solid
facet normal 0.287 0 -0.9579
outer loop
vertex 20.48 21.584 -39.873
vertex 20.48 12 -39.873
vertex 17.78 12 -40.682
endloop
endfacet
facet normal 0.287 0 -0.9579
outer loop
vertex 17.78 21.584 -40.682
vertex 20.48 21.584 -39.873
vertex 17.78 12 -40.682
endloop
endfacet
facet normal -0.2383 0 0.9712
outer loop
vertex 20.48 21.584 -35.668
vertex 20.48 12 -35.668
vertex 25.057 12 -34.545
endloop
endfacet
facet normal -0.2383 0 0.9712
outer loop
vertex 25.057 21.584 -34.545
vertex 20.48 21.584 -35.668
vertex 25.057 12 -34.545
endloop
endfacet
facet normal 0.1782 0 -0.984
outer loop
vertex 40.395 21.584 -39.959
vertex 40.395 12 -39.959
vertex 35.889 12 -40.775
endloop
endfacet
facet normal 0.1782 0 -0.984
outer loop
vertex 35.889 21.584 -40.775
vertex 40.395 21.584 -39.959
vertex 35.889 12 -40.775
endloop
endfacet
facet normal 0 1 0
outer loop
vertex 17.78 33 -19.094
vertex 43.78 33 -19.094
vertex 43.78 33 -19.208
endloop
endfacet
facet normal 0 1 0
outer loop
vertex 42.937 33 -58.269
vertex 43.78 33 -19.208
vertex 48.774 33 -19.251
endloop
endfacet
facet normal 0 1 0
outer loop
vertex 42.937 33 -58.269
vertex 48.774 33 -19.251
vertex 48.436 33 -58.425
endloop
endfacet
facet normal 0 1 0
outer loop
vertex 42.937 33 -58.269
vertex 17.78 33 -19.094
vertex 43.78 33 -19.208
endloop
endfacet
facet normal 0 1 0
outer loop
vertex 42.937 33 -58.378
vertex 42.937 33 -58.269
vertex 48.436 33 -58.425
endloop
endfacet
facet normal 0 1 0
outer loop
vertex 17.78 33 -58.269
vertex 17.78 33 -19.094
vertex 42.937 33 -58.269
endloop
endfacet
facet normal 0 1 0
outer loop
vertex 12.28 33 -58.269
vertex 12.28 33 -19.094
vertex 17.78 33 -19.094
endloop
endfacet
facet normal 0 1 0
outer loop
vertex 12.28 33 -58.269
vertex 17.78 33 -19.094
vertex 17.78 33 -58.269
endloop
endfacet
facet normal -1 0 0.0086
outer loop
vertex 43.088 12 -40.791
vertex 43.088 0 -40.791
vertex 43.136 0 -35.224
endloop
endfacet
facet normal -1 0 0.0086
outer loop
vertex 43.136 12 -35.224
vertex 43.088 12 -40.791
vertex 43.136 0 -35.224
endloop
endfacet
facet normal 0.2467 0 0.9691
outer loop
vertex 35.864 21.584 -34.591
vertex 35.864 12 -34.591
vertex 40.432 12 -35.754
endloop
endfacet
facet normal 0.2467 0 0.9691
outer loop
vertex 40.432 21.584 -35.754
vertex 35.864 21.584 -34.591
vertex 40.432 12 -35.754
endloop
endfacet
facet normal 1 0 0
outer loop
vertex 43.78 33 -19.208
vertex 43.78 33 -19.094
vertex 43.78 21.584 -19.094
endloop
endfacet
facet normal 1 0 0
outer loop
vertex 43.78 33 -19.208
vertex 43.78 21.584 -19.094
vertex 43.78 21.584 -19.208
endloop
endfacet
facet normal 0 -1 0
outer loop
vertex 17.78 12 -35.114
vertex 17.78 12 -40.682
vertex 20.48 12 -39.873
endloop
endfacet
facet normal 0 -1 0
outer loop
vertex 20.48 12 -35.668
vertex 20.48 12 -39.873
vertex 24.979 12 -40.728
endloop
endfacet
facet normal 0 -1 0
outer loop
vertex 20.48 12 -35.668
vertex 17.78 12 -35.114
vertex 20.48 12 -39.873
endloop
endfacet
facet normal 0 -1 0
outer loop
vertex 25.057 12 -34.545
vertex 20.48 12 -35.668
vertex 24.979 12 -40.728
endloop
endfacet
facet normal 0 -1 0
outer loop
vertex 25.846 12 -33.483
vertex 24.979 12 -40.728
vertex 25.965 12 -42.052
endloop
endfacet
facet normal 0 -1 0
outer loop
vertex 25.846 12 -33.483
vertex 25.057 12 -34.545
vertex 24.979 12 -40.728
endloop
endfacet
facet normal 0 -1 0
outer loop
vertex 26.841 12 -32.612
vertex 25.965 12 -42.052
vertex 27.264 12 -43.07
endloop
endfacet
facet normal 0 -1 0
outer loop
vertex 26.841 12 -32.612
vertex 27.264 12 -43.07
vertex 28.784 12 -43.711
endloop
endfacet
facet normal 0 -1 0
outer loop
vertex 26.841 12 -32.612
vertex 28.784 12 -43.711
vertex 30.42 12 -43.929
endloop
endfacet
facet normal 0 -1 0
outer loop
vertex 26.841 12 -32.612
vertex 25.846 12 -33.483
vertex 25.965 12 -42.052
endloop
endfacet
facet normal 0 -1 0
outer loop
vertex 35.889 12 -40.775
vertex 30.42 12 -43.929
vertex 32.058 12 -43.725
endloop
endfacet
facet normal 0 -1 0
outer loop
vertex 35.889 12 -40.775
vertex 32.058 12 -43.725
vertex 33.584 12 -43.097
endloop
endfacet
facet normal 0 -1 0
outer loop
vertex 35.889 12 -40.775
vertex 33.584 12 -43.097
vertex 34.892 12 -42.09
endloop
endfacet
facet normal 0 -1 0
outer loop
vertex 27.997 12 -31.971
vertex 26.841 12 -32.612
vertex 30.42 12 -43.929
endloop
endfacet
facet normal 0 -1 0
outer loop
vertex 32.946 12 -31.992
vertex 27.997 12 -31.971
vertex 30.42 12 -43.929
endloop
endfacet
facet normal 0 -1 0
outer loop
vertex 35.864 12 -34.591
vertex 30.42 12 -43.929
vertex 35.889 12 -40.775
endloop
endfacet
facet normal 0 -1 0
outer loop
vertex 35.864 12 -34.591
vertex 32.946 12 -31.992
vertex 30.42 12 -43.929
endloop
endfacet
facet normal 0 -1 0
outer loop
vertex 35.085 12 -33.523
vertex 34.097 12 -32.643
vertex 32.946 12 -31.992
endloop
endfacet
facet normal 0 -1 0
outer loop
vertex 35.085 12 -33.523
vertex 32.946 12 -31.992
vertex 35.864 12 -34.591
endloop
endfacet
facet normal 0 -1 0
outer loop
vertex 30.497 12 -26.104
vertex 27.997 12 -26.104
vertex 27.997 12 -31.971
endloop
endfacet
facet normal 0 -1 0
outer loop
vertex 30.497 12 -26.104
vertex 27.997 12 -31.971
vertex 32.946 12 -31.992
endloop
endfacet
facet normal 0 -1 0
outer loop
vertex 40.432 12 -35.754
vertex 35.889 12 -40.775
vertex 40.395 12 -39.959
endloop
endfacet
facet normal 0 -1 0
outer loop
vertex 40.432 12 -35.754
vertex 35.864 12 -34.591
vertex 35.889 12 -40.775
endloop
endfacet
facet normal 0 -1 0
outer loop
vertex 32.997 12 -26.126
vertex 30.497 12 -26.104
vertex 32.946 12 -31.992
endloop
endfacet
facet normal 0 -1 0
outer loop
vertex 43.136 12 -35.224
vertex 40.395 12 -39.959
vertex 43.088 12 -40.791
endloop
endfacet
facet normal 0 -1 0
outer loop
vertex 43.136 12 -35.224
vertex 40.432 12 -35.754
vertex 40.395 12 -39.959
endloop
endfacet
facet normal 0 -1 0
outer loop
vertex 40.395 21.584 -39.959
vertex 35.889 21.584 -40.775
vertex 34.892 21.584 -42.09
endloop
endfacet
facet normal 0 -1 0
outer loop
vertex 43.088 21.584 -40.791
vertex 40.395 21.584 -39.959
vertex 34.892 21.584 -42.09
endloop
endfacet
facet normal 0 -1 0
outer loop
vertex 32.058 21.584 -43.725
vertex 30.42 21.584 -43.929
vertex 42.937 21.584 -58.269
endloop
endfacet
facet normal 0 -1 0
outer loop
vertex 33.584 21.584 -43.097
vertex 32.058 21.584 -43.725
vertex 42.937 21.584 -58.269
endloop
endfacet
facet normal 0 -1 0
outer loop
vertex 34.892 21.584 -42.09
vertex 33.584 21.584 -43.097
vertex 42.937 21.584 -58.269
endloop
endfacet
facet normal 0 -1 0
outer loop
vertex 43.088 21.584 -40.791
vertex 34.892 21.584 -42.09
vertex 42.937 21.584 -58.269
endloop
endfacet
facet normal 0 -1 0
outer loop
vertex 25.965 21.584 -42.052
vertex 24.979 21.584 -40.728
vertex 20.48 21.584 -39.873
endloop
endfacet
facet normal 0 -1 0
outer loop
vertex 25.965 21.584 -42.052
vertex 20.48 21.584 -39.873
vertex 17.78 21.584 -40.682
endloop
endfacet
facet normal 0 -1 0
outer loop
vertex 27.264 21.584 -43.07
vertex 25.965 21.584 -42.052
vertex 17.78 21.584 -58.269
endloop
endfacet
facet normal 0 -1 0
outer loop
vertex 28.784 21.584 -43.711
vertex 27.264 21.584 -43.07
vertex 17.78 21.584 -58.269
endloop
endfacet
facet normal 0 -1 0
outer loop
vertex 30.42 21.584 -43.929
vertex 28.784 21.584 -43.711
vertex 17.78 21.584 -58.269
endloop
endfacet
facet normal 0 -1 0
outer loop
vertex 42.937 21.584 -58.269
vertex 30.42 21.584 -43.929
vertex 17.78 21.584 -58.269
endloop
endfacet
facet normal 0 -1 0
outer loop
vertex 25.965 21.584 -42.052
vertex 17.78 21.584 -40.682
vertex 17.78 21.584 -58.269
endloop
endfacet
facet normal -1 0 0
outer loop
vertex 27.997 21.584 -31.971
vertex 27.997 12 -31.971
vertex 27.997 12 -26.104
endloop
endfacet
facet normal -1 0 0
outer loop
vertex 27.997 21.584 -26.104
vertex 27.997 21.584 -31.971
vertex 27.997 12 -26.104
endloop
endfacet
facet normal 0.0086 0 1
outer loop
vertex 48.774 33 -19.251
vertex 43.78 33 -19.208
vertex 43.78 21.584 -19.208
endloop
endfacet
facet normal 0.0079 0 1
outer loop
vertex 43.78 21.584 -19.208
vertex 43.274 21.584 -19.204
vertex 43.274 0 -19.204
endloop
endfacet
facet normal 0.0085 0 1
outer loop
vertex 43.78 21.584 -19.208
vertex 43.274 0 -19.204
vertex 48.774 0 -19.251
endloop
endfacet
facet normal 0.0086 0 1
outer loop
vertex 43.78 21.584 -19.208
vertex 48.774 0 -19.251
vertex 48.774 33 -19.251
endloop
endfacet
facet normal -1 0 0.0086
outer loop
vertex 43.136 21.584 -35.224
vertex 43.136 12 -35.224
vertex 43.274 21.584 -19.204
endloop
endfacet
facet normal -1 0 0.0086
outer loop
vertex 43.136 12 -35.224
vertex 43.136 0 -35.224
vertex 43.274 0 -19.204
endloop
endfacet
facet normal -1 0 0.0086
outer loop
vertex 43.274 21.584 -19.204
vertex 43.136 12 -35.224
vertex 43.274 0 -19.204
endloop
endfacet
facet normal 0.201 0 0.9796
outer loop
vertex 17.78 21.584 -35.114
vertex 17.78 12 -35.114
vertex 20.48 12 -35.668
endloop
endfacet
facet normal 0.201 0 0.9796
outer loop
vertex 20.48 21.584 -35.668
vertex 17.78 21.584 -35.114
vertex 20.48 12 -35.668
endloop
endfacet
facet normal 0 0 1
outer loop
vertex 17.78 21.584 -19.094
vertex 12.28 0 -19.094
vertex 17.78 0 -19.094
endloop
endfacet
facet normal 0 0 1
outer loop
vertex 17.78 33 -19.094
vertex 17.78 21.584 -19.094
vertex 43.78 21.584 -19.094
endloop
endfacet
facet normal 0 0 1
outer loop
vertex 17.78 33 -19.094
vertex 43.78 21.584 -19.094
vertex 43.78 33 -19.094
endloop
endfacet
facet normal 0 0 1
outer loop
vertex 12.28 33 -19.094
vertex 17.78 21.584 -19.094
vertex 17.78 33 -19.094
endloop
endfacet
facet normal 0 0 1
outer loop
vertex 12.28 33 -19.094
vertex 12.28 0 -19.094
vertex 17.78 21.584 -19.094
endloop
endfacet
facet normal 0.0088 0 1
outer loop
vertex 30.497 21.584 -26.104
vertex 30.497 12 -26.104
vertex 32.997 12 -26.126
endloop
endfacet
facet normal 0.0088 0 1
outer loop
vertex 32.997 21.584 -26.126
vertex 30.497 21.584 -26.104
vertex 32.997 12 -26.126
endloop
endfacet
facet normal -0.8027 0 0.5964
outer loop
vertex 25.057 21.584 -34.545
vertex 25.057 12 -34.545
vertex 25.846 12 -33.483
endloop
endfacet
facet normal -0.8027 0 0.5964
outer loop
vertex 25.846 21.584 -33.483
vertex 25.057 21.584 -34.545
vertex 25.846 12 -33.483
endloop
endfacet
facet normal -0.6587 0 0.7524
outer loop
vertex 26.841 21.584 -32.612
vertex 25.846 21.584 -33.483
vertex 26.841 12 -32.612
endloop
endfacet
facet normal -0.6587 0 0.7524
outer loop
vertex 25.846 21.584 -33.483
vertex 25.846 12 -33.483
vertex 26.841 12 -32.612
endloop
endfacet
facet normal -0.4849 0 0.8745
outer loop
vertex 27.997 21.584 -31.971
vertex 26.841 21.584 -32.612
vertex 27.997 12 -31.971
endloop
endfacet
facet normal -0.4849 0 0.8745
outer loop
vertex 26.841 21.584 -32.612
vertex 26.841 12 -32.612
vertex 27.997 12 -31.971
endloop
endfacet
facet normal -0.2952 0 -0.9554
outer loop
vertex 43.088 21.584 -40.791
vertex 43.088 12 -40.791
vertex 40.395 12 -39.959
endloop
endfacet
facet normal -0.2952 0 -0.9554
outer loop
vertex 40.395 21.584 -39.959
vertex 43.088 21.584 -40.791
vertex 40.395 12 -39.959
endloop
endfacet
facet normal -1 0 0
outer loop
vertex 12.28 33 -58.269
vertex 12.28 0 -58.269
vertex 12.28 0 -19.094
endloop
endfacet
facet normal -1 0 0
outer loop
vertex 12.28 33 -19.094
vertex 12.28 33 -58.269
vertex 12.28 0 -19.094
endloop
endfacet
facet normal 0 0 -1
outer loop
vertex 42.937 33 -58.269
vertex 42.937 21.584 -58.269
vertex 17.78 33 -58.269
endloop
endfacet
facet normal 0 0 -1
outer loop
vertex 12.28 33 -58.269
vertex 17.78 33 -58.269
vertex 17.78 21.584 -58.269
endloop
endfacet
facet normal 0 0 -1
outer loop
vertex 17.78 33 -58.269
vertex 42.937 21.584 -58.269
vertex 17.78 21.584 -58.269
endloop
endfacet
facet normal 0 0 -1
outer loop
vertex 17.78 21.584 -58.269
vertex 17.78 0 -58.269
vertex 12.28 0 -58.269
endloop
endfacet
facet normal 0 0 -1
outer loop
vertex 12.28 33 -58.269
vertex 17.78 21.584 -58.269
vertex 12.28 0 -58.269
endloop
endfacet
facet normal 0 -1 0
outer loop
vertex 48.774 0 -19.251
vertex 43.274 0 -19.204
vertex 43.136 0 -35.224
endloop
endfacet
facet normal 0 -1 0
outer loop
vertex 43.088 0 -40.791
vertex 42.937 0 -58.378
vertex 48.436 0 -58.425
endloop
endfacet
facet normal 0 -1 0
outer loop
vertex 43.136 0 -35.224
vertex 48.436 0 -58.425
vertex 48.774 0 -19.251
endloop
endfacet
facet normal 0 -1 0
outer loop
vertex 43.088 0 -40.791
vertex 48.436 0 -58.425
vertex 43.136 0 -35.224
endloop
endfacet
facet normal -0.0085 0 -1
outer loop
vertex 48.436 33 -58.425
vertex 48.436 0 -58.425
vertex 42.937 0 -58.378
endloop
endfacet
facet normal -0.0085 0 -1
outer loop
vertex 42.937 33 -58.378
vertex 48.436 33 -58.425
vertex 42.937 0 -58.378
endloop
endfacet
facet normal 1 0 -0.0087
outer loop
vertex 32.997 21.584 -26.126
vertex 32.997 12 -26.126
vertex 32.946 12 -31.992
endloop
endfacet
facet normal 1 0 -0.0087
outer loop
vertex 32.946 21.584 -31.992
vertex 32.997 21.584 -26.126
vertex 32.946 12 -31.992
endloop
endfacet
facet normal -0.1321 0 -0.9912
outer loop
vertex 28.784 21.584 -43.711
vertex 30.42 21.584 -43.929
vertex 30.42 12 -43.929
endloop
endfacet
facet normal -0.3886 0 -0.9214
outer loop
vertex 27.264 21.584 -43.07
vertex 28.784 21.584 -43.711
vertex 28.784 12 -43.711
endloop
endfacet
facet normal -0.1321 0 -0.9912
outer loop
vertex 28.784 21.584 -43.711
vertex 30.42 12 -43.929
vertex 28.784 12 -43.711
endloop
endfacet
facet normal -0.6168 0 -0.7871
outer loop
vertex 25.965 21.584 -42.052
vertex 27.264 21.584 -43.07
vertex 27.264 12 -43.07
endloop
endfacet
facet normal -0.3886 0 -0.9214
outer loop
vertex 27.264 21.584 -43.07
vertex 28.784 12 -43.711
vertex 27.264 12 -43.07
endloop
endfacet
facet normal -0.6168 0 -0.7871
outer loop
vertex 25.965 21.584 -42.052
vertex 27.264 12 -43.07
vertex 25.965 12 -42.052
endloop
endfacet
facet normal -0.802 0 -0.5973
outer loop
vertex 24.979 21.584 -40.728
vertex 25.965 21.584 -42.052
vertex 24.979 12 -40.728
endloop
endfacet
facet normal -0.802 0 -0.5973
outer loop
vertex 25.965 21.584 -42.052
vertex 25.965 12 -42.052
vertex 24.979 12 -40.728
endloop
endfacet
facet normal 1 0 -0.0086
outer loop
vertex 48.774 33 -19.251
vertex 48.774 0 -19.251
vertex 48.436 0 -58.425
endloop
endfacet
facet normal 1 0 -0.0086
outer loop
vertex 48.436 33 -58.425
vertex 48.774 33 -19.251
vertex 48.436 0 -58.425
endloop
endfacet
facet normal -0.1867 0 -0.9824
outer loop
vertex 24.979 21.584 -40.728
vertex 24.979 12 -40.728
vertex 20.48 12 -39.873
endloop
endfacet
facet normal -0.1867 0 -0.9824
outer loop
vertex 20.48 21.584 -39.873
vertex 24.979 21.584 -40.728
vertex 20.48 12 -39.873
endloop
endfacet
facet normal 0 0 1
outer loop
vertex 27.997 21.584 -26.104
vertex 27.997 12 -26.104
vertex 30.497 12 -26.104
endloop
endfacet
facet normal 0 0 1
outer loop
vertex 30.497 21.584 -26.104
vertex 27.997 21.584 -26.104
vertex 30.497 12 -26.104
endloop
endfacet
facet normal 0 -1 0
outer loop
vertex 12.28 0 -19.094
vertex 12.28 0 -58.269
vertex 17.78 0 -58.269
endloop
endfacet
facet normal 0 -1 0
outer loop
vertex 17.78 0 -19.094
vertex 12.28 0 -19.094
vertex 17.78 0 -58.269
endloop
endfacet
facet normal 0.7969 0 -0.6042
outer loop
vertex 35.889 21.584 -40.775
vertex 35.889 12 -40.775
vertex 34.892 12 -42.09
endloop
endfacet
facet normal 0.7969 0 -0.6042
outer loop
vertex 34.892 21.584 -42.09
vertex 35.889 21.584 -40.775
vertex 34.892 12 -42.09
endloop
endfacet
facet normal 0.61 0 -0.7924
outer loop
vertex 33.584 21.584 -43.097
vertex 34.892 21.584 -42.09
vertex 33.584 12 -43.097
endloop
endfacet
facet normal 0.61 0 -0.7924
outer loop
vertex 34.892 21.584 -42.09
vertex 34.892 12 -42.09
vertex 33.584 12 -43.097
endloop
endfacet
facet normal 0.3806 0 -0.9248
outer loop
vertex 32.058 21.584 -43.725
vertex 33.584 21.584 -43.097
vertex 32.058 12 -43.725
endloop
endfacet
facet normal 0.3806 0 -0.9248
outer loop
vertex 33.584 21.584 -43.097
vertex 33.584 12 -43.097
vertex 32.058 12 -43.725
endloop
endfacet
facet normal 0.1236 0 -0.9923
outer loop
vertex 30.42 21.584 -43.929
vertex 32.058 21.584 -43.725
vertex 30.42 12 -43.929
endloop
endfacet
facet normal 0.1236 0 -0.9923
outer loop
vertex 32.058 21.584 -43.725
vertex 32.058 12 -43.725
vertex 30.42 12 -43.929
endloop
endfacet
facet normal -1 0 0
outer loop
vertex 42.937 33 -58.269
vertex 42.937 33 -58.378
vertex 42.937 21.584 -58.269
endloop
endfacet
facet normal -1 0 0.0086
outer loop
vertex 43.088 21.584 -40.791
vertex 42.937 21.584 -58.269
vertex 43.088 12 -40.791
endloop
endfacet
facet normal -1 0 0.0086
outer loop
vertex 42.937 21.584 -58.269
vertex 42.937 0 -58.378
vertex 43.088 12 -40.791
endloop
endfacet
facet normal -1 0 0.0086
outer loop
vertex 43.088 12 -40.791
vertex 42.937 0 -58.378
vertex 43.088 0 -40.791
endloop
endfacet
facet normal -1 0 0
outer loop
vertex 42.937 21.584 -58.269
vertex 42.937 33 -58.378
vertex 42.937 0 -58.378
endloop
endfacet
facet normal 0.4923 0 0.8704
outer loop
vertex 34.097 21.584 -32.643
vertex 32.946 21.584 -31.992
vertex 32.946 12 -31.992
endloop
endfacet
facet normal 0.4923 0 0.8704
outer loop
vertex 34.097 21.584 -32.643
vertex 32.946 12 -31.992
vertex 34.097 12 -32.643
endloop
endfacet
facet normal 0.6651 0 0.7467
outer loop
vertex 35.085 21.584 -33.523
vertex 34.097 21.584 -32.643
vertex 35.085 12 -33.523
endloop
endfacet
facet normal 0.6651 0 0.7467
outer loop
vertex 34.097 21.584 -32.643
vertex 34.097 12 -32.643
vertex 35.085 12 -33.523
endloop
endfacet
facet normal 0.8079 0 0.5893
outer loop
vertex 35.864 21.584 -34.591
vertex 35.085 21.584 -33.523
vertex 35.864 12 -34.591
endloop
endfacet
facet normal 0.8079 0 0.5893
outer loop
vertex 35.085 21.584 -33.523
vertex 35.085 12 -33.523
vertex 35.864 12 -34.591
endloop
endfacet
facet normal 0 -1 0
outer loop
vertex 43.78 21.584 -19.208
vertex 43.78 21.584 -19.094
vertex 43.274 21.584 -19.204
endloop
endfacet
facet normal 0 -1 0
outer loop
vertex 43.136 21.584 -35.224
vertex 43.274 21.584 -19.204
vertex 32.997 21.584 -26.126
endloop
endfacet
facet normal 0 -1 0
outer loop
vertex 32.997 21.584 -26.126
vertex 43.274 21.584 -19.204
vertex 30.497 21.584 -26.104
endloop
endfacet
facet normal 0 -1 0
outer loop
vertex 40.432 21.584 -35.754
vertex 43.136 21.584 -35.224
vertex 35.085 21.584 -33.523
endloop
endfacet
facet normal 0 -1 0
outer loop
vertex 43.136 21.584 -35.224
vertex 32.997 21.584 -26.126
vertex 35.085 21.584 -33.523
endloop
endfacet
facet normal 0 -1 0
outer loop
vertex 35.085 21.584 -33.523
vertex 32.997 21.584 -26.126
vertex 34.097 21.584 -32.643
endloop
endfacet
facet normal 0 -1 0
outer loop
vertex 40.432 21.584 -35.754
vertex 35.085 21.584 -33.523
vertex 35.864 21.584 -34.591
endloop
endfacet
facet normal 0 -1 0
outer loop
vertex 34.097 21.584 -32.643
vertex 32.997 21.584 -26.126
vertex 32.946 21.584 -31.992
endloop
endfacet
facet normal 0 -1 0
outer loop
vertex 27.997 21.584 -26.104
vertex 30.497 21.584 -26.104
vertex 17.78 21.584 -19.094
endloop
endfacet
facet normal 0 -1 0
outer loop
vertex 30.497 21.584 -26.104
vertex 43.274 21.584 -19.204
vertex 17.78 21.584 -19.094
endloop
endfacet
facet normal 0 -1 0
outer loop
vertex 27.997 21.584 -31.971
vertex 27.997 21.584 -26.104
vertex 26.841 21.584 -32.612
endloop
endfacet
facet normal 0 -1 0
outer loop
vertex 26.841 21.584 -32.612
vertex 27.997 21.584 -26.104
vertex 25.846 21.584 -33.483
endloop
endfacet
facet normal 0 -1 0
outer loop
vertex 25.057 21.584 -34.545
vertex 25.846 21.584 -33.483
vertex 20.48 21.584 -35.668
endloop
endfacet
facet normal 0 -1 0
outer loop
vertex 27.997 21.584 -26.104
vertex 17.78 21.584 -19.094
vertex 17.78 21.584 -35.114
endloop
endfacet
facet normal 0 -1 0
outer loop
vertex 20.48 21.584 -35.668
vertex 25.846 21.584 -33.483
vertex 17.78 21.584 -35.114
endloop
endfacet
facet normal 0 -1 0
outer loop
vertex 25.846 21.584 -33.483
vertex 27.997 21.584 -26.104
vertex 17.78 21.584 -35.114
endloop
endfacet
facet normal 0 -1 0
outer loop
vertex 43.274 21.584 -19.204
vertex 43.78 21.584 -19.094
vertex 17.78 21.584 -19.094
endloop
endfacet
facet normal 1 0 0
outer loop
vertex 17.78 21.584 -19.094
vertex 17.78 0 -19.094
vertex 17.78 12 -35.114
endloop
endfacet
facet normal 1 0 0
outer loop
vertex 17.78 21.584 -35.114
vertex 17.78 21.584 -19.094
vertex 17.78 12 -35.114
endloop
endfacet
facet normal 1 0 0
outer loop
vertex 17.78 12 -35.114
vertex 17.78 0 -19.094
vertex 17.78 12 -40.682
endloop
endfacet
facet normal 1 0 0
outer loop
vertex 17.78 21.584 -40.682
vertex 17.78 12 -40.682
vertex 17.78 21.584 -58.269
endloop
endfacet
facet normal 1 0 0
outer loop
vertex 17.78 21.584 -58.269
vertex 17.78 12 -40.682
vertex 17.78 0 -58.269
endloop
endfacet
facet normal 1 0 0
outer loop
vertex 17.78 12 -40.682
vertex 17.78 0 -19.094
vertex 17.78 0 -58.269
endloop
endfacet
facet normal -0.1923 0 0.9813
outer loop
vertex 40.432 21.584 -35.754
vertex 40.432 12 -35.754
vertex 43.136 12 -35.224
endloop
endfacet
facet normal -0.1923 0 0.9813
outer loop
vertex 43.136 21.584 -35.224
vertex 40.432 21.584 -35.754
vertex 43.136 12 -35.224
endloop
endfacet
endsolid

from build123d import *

# Parameters (mm, degrees)
BOSS_EXTRUDE1_DEPTH     = 33
CUT_EXTRUDE1_DEPTH      = 83.954293528
CUT_EXTRUDE1_DEPTH_BACK = 12
SKETCH3_W               = 9.481209811
SKETCH3_H               = 17.021727652
CUT_EXTRUDE2_DEPTH      = 22
SKETCH6_W               = 39.175540074
SKETCH6_H               = 11.416045591
BOSS_EXTRUDE3_DEPTH     = 26


with BuildPart() as part:
    # Sketch1 → Boss-Extrude1 (new body)
    with BuildSketch(Plane(origin=(0, 0, 0), x_dir=(1, 0, 0), z_dir=(0, 1, 0))):
        with BuildLine():
            Line((27.99701897, 26.104397373), (30.497019389, 26.104397373))
            Line((30.497019389, 26.104397373), (32.996926828, 26.125958592))
            Line((32.996926828, 26.125958592), (32.946330796, 31.992296402))
            ThreePointArc((32.946330796, 31.992296402), (34.614300355, 33.056919945), (35.86386473, 34.591238885))
            Line((35.86386473, 34.591238885), (40.431539769, 35.753760832))
            Line((40.431539769, 35.753760832), (43.136211097, 35.223788843))
            Line((43.136211097, 35.223788843), (43.274382132, 19.203600277))
            Line((43.274382132, 19.203600277), (48.774177579, 19.251034952))
            Line((48.774177579, 19.251034952), (48.43630867, 58.425118026))
            Line((48.43630867, 58.425118026), (42.936513223, 58.377683351))
            Line((42.936513223, 58.377683351), (43.088196039, 40.790876563))
            Line((43.088196039, 40.790876563), (40.395268448, 39.959225491))
            Line((40.395268448, 39.959225491), (35.888631414, 40.775372904))
            ThreePointArc((35.888631414, 40.775372904), (33.583892359, 43.097075019), (30.420151943, 43.929462788))
            ThreePointArc((30.420151943, 43.929462788), (27.263708108, 43.06982034), (24.979078258, 40.728327384))
            Line((24.979078258, 40.728327384), (20.479647685, 39.873342894))
            Line((20.479647685, 39.873342894), (17.779647685, 40.681737919))
            Line((17.779647685, 40.681737919), (17.779647685, 58.269198812))
            Line((17.779647685, 58.269198812), (12.279647685, 58.269198812))
            Line((12.279647685, 58.269198812), (12.279647685, 19.093658738))
            Line((12.279647685, 19.093658738), (17.779647685, 19.093658738))
            Line((17.779647685, 19.093658738), (17.779647685, 35.114443143))
            Line((17.779647685, 35.114443143), (20.479647685, 35.667721822))
            Line((20.479647685, 35.667721822), (25.057179, 34.544636961))
            ThreePointArc((25.057179, 34.544636961), (26.319929615, 33.021151936), (27.99701897, 31.970953369))
            Line((27.99701897, 31.970953369), (27.99701897, 26.104397373))
        make_face()
    extrude(amount=BOSS_EXTRUDE1_DEPTH)

    # Sketch2 → Cut-Extrude1 (cut, two sides: drawn at the far end of the back side and taken through both)
    with BuildSketch(Plane.XZ.offset(-CUT_EXTRUDE1_DEPTH_BACK)):
        with BuildLine():
            Line((20.479647685, -35.667721822), (17.779647685, -35.114443143))
            Line((17.779647685, -35.114443143), (17.779647685, -40.681737919))
            Line((17.779647685, -40.681737919), (20.479647685, -39.873342894))
            Line((20.479647685, -39.873342894), (24.979078258, -40.728327384))
            ThreePointArc((24.979078258, -40.728327384), (27.263708108, -43.06982034), (30.420151943, -43.929462788))
            ThreePointArc((30.420151943, -43.929462788), (33.576595778, -43.084424394), (35.888631414, -40.775372904))
            Line((35.888631414, -40.775372904), (40.395268448, -39.959225491))
            Line((40.395268448, -39.959225491), (43.088196039, -40.790876563))
            Line((43.088196039, -40.790876563), (43.136211097, -35.223788843))
            Line((43.136211097, -35.223788843), (40.431539769, -35.753760832))
            Line((40.431539769, -35.753760832), (35.86386473, -34.591238885))
            ThreePointArc((35.86386473, -34.591238885), (34.614300355, -33.056919945), (32.946330796, -31.992296402))
            Line((32.946330796, -31.992296402), (32.996926828, -26.125958592))
            Line((32.996926828, -26.125958592), (27.99701897, -26.104397373))
            Line((27.99701897, -26.104397373), (27.99701897, -31.970953369))
            ThreePointArc((27.99701897, -31.970953369), (26.319929615, -33.021151936), (25.057179, -34.544636961))
            Line((25.057179, -34.544636961), (20.479647685, -35.667721822))
        make_face()
    extrude(amount=CUT_EXTRUDE1_DEPTH + CUT_EXTRUDE1_DEPTH_BACK, mode=Mode.SUBTRACT)

    # Sketch3 → Cut-Extrude2 (cut)
    with BuildSketch(Plane.XY.offset(-26.104397373)):
        with Locations((32.737623876, 3.489136174)):
            Rectangle(SKETCH3_W, SKETCH3_H)
    extrude(amount=-CUT_EXTRUDE2_DEPTH, mode=Mode.SUBTRACT)

    # Sketch6 → Boss-Extrude3 (add)
    with BuildSketch(Plane(origin=(17.779647685, 0, 0), x_dir=(0, 0, -1), z_dir=(1, 0, 0))):
        with Locations((38.681428775, 27.291977205)):
            Rectangle(SKETCH6_W, SKETCH6_H)
    extrude(amount=BOSS_EXTRUDE3_DEPTH)


solid = part.part
